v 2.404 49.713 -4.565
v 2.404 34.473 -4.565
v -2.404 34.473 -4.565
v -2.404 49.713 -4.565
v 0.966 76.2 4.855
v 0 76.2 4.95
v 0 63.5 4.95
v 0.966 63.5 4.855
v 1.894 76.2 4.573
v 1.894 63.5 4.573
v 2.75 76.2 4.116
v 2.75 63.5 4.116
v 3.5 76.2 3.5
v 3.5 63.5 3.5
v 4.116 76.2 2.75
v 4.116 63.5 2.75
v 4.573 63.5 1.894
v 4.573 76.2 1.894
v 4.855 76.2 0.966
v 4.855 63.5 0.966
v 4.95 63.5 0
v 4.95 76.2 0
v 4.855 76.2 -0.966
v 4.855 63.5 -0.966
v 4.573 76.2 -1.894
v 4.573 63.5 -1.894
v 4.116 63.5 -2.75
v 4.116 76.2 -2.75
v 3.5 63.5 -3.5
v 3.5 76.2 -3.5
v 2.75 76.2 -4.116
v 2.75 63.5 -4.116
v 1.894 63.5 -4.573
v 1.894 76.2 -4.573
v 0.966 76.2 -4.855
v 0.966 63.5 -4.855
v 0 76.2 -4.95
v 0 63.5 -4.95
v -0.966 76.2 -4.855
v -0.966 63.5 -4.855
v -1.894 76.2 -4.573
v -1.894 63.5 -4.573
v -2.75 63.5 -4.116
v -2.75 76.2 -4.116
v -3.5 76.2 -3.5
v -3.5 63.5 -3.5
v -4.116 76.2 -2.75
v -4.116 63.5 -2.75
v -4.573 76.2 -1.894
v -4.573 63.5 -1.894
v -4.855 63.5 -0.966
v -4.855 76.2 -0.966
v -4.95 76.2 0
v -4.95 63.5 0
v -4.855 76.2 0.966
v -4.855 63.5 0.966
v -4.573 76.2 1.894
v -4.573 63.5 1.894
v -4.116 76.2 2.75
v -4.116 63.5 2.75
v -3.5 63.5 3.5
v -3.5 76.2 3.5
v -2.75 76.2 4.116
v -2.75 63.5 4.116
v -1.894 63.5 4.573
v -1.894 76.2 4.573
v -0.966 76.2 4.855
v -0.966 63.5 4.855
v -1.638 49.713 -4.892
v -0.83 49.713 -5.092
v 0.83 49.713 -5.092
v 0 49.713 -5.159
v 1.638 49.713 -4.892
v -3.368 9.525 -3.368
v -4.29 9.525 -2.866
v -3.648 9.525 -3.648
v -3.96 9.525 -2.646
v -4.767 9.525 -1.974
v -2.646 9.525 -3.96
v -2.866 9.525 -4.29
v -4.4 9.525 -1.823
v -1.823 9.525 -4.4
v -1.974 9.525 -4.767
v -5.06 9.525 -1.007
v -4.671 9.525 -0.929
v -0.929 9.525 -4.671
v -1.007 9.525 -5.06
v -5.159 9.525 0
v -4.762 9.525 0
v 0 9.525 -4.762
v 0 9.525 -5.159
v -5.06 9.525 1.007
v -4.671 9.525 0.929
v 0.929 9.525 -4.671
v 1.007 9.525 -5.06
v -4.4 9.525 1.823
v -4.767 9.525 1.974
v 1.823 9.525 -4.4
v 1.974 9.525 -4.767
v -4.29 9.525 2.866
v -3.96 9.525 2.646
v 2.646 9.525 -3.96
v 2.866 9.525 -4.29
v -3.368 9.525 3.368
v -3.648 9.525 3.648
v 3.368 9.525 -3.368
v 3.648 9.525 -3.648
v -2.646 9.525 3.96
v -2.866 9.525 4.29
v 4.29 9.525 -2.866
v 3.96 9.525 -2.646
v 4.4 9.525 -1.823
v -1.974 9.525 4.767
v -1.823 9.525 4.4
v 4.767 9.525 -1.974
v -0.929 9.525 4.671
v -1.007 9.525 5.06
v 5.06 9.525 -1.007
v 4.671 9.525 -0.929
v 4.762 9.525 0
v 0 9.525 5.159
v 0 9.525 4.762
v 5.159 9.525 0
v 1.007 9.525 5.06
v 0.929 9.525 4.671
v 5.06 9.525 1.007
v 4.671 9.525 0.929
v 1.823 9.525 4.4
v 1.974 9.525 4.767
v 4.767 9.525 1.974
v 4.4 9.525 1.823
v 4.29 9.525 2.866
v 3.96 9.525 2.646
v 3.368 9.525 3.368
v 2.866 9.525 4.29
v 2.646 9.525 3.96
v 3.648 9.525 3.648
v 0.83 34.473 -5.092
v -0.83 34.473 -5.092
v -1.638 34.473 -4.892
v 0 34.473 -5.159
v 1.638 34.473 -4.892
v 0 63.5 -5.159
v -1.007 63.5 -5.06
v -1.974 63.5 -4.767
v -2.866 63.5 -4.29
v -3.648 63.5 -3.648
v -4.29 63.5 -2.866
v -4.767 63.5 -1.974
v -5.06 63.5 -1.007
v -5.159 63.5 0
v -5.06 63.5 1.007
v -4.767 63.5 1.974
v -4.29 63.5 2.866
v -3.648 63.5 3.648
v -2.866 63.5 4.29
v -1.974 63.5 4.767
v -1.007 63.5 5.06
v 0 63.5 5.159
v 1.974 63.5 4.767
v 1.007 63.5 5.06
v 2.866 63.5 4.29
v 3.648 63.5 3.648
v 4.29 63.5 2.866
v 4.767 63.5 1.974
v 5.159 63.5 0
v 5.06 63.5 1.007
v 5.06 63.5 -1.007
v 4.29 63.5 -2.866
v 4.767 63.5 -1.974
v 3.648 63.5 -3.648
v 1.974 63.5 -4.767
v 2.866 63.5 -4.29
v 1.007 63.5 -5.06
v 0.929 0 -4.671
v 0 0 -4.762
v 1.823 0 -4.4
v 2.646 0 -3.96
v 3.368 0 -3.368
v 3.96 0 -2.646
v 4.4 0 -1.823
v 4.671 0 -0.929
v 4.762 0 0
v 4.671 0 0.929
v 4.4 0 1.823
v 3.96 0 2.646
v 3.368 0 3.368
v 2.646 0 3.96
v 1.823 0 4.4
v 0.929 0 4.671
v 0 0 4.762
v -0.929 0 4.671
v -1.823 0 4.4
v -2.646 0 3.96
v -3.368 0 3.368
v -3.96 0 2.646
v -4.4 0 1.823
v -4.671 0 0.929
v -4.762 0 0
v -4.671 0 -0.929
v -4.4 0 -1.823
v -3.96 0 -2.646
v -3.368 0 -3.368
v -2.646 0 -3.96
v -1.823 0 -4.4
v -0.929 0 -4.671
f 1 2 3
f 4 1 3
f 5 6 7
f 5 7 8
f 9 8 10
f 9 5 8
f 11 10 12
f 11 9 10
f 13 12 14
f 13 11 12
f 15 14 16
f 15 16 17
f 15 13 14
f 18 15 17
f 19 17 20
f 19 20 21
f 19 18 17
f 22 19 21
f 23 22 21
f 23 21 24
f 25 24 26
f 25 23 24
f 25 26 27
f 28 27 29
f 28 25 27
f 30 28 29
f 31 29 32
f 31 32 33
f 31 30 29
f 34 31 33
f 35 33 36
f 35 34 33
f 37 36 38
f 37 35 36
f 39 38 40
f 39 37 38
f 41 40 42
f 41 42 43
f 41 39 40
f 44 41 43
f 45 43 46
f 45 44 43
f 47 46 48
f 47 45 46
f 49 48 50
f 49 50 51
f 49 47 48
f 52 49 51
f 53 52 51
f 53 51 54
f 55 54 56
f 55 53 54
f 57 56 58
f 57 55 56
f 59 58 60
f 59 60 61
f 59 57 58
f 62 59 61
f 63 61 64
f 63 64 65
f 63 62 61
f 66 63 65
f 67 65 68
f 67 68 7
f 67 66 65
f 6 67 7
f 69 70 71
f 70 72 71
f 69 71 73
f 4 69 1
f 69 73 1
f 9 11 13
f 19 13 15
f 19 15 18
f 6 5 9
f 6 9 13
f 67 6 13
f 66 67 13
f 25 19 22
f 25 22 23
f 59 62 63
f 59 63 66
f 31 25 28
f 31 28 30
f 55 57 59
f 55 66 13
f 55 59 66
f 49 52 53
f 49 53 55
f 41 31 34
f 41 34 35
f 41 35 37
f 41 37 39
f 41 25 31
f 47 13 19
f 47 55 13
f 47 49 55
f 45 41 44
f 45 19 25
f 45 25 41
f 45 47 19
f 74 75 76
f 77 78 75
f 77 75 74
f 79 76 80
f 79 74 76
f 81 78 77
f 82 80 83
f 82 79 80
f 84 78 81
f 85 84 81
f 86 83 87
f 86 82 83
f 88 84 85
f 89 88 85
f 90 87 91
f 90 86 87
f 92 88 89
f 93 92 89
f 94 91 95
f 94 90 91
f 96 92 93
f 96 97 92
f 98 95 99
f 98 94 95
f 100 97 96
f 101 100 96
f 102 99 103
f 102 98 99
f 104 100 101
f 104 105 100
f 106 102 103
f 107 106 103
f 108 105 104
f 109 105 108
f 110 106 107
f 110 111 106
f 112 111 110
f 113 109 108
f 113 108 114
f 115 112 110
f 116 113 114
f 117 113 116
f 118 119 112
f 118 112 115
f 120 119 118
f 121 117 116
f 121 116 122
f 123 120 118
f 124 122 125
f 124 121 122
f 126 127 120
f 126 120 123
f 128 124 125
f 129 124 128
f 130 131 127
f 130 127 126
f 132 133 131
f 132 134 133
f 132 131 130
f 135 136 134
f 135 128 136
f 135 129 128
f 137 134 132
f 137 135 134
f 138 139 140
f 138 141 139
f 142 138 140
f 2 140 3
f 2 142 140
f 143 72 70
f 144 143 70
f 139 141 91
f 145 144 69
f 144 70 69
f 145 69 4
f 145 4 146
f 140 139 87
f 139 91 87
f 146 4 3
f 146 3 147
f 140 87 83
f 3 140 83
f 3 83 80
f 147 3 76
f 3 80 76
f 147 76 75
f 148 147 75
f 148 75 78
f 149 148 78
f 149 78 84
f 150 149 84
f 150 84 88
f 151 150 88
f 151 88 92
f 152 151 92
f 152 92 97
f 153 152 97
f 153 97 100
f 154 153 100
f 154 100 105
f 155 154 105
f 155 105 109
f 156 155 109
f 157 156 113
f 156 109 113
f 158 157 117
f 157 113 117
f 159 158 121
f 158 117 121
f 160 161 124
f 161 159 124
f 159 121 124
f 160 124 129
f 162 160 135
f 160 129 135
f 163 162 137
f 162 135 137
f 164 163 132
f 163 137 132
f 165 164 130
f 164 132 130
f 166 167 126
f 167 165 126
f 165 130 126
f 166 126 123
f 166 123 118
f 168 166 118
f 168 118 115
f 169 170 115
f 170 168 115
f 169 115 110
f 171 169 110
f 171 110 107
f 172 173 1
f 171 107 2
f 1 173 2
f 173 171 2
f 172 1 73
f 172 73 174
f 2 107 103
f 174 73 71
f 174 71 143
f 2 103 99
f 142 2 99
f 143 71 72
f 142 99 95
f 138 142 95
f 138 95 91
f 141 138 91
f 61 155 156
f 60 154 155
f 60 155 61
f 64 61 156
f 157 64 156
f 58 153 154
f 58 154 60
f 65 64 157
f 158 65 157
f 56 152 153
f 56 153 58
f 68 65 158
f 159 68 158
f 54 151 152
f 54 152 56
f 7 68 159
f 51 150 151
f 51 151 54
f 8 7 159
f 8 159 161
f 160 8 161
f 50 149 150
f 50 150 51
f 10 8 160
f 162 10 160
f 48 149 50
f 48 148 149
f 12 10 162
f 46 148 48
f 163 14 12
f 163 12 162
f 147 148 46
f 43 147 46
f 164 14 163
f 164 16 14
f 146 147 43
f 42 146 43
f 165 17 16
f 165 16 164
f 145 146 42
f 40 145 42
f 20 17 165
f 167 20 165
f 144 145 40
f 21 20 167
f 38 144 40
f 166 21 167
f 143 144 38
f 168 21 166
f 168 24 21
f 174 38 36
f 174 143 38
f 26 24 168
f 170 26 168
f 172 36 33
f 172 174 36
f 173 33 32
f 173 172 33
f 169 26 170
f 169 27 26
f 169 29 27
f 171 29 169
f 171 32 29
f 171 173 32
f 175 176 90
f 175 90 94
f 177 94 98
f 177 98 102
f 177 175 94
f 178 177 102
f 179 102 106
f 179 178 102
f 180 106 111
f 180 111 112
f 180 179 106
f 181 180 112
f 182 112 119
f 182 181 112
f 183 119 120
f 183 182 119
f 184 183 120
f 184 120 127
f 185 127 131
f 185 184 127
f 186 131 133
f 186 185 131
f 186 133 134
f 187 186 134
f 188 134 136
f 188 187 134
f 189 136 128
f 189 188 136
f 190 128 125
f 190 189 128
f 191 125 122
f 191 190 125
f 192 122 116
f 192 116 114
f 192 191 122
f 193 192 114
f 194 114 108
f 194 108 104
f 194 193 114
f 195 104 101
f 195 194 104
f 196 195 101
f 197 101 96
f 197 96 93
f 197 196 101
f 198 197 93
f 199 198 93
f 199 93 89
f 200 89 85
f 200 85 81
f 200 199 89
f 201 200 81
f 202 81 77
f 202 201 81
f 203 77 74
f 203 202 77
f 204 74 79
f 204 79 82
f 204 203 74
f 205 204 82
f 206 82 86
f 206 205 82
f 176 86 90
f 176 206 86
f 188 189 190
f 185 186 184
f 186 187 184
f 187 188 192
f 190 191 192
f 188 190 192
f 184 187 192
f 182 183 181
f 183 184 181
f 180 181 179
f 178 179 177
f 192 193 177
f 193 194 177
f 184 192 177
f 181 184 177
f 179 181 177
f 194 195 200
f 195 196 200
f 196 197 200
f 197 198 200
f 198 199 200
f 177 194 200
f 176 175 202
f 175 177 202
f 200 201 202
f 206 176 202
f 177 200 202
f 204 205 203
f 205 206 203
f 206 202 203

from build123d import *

# Parameters (mm, degrees)
SKETCH1_R           = 5.159375
BOSS_EXTRUDE1_DEPTH = 76.2
SKETCH2_R           = 5.582507509
SKETCH2_R_2         = 4.95
CUT_EXTRUDE1_DEPTH  = 12.7
CUT_EXTRUDE2_DEPTH  = 15.24
SKETCH5_R           = 6.855394903
SKETCH5_R_2         = 4.7625
CUT_EXTRUDE3_DEPTH  = 9.525


with BuildPart() as part:
    # Sketch1 → Boss-Extrude1 (new body)
    with BuildSketch(Plane(origin=(0, 0, 0), x_dir=(1, 0, 0), z_dir=(0, 1, 0))):
        with Locations(Location((0, 0, 0), (0, 0, 90))):
            Circle(SKETCH1_R)
    extrude(amount=BOSS_EXTRUDE1_DEPTH)

    # Sketch2 → Cut-Extrude1 (cut)
    with BuildSketch(Plane(origin=(0, 76.2, 0), x_dir=(1, 0, 0), z_dir=(0, 1, 0))):
        Circle(SKETCH2_R)
        with Locations(Location((0, 0, 0), (0, 0, 270))):
            Circle(SKETCH2_R_2, mode=Mode.SUBTRACT)
    extrude(amount=-CUT_EXTRUDE1_DEPTH, mode=Mode.SUBTRACT)

    # Sketch4 → Cut-Extrude2 (cut)
    with BuildSketch(Plane(origin=(4747.84892855, 34.473117596, 51.91521842), x_dir=(-1, 0, 0), z_dir=(0, -1, 0))):
        Polygon((4747.84892855, 56.48021842), (4739.672253117, 56.48021842), (4739.672253117, 59.680433841), (4755.943170737, 59.680433841), (4755.943170737, 56.48021842), align=None)
    extrude(amount=-CUT_EXTRUDE2_DEPTH, mode=Mode.SUBTRACT)

    # Sketch5 → Cut-Extrude3 (cut)
    with BuildSketch(Plane.XZ):
        Circle(SKETCH5_R)
        with Locations(Location((0, 0, 0), (0, 0, 270))):
            Circle(SKETCH5_R_2, mode=Mode.SUBTRACT)
    extrude(amount=-CUT_EXTRUDE3_DEPTH, mode=Mode.SUBTRACT)


solid = part.part
